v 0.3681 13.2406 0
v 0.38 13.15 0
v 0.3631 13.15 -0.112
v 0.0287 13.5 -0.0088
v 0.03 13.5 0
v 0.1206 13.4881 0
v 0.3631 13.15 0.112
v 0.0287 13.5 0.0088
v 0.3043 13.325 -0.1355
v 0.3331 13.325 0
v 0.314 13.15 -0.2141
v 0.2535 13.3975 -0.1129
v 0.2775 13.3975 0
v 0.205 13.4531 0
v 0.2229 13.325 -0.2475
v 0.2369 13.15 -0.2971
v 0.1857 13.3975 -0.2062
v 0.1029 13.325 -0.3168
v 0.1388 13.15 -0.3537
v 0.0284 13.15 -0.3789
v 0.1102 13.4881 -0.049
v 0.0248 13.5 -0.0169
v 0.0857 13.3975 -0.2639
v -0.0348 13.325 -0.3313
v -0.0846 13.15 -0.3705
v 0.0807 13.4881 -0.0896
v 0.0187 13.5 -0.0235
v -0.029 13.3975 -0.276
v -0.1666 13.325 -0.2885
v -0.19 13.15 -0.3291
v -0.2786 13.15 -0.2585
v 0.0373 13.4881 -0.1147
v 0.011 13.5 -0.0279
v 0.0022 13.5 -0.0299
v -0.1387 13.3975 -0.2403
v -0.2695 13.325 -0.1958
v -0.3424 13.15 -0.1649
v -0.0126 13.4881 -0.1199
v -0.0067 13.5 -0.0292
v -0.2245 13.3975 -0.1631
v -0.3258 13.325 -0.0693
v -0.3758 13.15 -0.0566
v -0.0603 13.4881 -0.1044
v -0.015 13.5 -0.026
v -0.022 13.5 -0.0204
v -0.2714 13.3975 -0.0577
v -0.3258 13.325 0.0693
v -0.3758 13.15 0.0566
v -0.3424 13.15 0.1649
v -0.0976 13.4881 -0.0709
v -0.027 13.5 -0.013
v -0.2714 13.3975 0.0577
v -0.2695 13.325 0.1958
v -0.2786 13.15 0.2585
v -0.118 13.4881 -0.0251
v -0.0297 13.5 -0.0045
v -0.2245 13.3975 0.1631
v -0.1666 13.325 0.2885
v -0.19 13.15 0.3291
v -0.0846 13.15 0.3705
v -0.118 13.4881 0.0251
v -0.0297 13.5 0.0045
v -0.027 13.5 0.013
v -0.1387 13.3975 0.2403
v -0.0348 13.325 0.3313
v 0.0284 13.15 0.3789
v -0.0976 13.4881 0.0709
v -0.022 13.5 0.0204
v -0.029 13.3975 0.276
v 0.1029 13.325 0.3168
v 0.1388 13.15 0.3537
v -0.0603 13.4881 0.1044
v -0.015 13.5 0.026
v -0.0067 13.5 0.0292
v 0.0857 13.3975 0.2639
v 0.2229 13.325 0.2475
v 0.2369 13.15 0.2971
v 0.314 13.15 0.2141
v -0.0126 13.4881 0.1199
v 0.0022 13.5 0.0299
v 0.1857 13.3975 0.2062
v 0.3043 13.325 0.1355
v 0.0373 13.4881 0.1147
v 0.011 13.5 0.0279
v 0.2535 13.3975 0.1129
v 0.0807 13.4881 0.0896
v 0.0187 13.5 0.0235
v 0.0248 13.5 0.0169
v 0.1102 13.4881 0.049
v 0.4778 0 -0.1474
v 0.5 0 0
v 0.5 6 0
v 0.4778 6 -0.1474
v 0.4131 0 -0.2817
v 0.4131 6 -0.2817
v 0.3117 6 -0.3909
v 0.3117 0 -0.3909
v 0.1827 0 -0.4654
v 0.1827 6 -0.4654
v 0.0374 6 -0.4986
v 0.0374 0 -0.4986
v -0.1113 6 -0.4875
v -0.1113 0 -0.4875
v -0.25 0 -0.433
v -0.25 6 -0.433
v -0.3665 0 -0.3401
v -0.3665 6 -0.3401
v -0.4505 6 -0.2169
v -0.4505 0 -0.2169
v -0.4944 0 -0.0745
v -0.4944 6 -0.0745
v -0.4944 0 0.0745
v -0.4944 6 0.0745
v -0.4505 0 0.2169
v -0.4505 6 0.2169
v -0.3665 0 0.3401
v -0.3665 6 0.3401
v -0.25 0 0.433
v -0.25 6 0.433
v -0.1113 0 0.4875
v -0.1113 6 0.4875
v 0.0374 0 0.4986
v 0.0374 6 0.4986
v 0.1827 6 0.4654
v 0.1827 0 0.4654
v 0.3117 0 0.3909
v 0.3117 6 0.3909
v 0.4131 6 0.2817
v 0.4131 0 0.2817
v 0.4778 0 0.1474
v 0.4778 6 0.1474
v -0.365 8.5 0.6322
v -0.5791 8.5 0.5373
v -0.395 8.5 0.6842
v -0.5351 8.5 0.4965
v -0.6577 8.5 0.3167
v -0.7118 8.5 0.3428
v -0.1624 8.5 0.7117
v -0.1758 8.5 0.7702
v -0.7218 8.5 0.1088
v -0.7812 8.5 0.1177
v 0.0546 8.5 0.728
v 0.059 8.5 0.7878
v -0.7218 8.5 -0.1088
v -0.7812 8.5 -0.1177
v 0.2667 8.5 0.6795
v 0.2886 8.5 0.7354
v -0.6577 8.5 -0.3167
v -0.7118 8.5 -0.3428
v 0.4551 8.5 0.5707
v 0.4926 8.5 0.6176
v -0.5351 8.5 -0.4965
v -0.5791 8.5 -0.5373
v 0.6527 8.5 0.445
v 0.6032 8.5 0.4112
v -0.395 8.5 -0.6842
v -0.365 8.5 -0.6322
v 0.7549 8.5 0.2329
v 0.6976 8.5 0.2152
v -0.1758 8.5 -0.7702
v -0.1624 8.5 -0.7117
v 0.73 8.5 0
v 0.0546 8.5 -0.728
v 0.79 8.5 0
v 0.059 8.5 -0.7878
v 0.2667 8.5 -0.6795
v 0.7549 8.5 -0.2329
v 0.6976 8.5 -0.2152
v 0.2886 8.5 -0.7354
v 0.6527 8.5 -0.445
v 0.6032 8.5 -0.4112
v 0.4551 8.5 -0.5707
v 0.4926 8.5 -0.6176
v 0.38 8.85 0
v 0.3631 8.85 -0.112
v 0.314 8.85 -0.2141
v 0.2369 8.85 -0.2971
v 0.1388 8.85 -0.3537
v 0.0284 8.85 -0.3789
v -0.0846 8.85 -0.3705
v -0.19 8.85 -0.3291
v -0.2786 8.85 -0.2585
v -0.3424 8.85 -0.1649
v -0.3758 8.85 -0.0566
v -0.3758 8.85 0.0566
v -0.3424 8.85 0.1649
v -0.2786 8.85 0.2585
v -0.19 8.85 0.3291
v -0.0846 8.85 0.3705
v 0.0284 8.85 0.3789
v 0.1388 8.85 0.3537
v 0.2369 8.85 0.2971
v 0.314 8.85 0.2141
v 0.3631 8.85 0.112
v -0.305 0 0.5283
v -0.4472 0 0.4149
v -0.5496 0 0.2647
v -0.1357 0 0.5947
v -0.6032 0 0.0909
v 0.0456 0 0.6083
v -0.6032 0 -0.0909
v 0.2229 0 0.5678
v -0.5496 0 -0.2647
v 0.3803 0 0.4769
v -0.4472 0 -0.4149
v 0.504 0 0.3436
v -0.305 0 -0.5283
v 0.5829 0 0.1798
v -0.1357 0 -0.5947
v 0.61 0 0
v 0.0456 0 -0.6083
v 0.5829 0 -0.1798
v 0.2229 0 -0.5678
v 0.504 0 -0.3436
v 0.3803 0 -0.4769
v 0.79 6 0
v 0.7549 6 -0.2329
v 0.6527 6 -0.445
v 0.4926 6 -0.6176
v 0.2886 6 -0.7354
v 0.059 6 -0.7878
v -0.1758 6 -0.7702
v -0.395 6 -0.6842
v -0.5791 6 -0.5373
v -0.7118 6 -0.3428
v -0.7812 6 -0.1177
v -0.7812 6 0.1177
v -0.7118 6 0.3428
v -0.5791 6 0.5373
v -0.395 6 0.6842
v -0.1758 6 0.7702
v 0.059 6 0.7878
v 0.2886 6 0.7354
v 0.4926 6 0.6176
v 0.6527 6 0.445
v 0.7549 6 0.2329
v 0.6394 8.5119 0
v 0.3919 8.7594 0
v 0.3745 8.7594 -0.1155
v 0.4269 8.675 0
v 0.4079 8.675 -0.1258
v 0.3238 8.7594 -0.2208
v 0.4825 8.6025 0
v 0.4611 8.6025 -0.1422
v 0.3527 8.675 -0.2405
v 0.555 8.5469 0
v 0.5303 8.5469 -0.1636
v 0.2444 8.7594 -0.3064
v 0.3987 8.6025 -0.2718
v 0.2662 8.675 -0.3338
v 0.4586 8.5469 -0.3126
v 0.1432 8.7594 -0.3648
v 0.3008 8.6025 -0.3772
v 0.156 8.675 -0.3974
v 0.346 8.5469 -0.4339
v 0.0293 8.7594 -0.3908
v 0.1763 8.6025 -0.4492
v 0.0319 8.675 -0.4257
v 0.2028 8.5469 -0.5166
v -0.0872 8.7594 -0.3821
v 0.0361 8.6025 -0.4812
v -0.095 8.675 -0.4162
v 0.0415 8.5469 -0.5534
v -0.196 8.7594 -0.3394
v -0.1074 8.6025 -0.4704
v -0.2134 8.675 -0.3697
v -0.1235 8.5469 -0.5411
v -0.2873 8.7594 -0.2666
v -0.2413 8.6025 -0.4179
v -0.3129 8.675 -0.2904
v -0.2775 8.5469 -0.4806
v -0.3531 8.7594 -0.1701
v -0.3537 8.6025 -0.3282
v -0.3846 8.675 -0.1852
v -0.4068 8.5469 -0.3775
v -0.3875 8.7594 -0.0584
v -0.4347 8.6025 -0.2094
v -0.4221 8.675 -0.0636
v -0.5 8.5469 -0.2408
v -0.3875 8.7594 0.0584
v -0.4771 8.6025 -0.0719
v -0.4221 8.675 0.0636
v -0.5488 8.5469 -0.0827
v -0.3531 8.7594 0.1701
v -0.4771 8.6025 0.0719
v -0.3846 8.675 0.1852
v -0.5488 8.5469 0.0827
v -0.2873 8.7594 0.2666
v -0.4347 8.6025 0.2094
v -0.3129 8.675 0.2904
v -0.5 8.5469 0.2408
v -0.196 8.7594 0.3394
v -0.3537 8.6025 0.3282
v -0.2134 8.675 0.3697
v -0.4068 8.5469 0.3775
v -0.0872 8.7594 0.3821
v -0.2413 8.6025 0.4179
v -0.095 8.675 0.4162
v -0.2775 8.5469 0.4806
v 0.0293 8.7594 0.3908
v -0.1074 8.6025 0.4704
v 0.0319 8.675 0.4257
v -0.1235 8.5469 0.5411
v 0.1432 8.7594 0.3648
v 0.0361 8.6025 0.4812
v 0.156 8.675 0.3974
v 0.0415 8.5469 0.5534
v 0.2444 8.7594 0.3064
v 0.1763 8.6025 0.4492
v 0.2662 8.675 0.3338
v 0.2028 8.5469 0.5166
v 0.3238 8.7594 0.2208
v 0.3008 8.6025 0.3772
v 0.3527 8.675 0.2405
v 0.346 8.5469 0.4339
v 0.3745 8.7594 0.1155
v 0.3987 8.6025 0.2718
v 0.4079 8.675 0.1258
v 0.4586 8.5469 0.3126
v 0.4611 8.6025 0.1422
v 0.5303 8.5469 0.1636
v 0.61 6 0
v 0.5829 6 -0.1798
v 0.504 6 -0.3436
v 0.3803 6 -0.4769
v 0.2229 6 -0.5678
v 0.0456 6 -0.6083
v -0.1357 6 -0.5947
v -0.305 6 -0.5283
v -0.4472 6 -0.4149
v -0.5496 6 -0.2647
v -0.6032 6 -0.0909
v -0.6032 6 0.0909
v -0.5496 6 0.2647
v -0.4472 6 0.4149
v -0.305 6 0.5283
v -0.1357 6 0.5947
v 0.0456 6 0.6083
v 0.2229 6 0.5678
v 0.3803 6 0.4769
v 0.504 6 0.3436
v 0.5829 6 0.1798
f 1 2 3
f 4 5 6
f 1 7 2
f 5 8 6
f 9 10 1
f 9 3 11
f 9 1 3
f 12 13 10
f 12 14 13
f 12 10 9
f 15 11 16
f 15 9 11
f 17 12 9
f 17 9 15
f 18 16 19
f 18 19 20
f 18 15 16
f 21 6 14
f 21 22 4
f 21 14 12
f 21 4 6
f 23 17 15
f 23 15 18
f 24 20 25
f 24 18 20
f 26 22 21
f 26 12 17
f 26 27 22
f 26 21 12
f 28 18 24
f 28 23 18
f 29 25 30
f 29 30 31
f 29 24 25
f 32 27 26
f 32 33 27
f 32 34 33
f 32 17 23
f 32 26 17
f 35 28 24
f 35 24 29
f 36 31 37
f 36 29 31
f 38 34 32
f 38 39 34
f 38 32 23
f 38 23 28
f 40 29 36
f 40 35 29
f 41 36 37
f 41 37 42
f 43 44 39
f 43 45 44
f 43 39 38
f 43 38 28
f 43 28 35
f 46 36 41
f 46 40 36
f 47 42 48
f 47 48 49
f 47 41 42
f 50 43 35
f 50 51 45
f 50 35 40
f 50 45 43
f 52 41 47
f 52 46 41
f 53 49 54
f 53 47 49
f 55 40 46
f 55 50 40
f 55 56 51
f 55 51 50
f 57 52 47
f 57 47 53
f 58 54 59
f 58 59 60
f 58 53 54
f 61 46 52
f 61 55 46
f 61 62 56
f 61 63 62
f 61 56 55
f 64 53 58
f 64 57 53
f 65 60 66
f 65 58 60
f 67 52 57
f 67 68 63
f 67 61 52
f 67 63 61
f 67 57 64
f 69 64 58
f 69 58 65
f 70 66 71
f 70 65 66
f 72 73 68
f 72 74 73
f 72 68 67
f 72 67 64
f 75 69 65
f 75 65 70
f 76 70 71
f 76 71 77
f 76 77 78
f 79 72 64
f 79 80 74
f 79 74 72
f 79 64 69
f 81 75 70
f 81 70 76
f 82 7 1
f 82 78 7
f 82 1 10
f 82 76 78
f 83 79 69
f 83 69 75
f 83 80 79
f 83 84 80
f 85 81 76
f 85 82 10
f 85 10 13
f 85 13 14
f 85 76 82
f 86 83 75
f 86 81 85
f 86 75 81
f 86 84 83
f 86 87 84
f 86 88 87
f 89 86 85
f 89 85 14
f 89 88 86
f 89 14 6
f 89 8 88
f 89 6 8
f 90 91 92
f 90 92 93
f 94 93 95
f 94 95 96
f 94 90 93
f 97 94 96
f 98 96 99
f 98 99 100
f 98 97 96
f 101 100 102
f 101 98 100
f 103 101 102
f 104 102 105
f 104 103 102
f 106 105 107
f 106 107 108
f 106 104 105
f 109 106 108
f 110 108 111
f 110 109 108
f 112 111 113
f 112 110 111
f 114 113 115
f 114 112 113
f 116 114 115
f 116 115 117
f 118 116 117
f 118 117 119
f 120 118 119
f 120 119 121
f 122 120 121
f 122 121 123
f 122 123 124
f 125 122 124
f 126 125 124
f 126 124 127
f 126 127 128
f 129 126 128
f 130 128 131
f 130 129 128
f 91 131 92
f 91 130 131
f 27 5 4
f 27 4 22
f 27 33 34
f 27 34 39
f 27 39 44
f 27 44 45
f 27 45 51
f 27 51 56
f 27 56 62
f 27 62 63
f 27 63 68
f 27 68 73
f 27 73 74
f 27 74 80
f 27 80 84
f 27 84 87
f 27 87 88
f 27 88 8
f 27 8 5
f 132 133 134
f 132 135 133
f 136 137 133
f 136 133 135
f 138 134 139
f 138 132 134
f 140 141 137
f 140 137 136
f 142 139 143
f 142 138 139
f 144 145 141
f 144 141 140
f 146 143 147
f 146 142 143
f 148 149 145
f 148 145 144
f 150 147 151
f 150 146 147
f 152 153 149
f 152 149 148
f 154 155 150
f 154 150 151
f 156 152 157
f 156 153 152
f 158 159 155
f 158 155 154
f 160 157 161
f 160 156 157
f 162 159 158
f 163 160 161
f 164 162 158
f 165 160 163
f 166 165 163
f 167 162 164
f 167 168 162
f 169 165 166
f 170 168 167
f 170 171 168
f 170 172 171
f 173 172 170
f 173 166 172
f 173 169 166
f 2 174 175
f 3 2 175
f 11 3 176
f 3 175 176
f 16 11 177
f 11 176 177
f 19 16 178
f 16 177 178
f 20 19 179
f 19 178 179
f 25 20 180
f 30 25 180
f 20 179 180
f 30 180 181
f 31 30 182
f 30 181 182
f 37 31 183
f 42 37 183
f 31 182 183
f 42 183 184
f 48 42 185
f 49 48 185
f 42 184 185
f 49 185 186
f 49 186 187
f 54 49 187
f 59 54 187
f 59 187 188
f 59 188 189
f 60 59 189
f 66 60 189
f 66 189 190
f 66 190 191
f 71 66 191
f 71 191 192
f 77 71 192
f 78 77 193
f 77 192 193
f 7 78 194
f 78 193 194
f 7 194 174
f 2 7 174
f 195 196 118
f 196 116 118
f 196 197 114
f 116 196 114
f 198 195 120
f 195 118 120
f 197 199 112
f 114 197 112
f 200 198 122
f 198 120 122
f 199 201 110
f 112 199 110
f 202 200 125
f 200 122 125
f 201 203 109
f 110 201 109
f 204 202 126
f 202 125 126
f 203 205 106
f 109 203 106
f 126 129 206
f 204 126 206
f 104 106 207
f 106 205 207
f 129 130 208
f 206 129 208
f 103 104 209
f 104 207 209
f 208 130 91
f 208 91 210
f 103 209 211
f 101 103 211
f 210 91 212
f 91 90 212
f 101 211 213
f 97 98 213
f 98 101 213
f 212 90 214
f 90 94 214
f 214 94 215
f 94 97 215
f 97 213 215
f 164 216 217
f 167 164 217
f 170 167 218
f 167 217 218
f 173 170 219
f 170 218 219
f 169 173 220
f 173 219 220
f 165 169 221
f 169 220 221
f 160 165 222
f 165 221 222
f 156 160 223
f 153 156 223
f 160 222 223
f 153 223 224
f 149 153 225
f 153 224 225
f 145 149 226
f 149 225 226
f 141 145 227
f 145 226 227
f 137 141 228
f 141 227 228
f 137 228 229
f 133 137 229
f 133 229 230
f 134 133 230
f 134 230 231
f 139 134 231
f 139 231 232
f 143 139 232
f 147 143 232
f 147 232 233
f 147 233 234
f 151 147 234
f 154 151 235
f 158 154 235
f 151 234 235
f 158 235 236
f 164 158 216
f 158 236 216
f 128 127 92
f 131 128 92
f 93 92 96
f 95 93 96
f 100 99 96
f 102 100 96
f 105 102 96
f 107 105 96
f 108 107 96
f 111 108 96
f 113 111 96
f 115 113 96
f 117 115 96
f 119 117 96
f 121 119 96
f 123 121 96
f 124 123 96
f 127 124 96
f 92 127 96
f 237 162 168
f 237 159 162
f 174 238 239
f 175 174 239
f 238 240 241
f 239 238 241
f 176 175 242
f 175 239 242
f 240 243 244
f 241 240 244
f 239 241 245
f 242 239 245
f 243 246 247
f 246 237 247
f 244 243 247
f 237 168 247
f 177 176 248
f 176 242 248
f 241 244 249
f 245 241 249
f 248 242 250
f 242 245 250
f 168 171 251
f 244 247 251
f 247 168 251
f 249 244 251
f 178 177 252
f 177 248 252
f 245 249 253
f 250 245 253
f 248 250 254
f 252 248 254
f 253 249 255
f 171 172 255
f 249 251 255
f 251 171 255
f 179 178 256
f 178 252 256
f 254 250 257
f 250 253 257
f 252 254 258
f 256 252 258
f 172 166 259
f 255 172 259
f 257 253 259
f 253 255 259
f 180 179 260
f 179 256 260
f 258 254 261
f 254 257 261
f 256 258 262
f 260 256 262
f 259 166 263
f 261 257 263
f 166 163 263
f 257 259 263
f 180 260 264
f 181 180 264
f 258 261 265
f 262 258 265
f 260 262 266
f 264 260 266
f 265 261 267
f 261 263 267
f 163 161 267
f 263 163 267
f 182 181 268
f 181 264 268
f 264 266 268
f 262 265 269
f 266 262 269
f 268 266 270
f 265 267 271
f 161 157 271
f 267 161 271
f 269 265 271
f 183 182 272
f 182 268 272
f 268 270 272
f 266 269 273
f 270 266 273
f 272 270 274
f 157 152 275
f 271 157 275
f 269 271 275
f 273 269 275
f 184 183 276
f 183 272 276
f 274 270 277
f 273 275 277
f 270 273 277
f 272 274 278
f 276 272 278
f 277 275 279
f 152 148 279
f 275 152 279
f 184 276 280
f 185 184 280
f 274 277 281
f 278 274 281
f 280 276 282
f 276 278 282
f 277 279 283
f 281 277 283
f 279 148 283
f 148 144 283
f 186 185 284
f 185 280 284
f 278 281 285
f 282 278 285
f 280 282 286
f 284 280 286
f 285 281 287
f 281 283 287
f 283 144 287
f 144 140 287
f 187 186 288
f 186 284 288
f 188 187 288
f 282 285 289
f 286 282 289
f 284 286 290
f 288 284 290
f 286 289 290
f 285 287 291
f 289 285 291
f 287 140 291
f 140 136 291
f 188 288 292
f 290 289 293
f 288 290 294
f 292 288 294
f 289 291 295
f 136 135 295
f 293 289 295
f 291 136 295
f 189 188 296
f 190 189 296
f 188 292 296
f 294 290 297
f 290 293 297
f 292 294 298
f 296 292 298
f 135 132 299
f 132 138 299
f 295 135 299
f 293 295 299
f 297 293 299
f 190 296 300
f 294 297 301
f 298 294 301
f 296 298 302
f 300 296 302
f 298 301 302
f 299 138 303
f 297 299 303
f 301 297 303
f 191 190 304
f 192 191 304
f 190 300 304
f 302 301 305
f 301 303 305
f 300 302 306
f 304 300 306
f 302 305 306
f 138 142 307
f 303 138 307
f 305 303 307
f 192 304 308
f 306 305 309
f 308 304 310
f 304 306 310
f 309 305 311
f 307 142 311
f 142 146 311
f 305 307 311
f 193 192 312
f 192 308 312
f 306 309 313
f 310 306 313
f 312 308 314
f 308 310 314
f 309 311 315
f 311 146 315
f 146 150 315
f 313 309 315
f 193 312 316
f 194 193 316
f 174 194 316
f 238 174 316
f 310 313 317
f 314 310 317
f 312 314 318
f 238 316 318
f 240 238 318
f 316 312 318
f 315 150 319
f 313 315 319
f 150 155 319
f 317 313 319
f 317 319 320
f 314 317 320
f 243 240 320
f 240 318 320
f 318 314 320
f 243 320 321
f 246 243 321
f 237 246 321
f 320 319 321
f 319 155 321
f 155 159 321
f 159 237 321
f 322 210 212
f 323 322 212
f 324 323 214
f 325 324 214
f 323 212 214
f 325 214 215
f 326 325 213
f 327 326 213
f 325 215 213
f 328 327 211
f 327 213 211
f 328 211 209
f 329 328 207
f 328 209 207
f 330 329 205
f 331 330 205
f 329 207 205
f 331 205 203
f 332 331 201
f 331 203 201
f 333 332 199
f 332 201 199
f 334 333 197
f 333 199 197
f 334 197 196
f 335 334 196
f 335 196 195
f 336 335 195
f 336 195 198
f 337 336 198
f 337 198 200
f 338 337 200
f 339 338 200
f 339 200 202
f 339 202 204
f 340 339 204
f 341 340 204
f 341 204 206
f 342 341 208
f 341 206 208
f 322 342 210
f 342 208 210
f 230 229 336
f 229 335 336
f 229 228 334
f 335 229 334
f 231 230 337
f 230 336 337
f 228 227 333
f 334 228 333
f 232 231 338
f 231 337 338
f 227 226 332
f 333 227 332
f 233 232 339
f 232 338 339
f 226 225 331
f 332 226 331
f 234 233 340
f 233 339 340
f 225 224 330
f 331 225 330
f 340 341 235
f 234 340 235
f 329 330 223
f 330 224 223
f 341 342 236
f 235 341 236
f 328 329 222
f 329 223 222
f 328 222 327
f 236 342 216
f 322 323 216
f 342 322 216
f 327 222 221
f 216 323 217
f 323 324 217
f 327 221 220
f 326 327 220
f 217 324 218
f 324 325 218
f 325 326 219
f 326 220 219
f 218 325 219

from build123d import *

# Parameters (mm, degrees)
SKETCH1_R           = 0.61
SKETCH1_R_2         = 0.5
BOSS_EXTRUDE1_DEPTH = 6
SKETCH2_R           = 0.79
BOSS_EXTRUDE2_DEPTH = 2.5
SKETCH3_R           = 0.38
BOSS_EXTRUDE3_DEPTH = 5
FILLET1_R           = 0.35
FILLET2_R           = 0.35


with BuildPart() as part:
    # Sketch1 → Boss-Extrude1 (new body)
    with BuildSketch(Plane(origin=(0, 0, 0), x_dir=(1, 0, 0), z_dir=(0, 1, 0))):
        Circle(SKETCH1_R)
        Circle(SKETCH1_R_2, mode=Mode.SUBTRACT)
    extrude(amount=BOSS_EXTRUDE1_DEPTH)

    # Sketch2 → Boss-Extrude2 (add)
    with BuildSketch(Plane(origin=(0, 6, 0), x_dir=(1, 0, 0), z_dir=(0, 1, 0))):
        Circle(SKETCH2_R)
    extrude(amount=BOSS_EXTRUDE2_DEPTH)

    # Sketch3 → Boss-Extrude3 (add)
    with BuildSketch(Plane(origin=(0, 8.5, 0), x_dir=(1, 0, 0), z_dir=(0, 1, 0))):
        Circle(SKETCH3_R)
    extrude(amount=BOSS_EXTRUDE3_DEPTH)

    # Fillet1
    fillet1_edges = [part.edges().sort_by_distance(p)[0] for p in [
        (-0.38, 13.5, 0),
    ]]
    fillet(fillet1_edges, radius=FILLET1_R)

    # Fillet2
    fillet2_edges = [part.edges().sort_by_distance(p)[0] for p in [
        (-0.38, 8.5, 0),
    ]]
    fillet(fillet2_edges, radius=FILLET2_R)


solid = part.part
